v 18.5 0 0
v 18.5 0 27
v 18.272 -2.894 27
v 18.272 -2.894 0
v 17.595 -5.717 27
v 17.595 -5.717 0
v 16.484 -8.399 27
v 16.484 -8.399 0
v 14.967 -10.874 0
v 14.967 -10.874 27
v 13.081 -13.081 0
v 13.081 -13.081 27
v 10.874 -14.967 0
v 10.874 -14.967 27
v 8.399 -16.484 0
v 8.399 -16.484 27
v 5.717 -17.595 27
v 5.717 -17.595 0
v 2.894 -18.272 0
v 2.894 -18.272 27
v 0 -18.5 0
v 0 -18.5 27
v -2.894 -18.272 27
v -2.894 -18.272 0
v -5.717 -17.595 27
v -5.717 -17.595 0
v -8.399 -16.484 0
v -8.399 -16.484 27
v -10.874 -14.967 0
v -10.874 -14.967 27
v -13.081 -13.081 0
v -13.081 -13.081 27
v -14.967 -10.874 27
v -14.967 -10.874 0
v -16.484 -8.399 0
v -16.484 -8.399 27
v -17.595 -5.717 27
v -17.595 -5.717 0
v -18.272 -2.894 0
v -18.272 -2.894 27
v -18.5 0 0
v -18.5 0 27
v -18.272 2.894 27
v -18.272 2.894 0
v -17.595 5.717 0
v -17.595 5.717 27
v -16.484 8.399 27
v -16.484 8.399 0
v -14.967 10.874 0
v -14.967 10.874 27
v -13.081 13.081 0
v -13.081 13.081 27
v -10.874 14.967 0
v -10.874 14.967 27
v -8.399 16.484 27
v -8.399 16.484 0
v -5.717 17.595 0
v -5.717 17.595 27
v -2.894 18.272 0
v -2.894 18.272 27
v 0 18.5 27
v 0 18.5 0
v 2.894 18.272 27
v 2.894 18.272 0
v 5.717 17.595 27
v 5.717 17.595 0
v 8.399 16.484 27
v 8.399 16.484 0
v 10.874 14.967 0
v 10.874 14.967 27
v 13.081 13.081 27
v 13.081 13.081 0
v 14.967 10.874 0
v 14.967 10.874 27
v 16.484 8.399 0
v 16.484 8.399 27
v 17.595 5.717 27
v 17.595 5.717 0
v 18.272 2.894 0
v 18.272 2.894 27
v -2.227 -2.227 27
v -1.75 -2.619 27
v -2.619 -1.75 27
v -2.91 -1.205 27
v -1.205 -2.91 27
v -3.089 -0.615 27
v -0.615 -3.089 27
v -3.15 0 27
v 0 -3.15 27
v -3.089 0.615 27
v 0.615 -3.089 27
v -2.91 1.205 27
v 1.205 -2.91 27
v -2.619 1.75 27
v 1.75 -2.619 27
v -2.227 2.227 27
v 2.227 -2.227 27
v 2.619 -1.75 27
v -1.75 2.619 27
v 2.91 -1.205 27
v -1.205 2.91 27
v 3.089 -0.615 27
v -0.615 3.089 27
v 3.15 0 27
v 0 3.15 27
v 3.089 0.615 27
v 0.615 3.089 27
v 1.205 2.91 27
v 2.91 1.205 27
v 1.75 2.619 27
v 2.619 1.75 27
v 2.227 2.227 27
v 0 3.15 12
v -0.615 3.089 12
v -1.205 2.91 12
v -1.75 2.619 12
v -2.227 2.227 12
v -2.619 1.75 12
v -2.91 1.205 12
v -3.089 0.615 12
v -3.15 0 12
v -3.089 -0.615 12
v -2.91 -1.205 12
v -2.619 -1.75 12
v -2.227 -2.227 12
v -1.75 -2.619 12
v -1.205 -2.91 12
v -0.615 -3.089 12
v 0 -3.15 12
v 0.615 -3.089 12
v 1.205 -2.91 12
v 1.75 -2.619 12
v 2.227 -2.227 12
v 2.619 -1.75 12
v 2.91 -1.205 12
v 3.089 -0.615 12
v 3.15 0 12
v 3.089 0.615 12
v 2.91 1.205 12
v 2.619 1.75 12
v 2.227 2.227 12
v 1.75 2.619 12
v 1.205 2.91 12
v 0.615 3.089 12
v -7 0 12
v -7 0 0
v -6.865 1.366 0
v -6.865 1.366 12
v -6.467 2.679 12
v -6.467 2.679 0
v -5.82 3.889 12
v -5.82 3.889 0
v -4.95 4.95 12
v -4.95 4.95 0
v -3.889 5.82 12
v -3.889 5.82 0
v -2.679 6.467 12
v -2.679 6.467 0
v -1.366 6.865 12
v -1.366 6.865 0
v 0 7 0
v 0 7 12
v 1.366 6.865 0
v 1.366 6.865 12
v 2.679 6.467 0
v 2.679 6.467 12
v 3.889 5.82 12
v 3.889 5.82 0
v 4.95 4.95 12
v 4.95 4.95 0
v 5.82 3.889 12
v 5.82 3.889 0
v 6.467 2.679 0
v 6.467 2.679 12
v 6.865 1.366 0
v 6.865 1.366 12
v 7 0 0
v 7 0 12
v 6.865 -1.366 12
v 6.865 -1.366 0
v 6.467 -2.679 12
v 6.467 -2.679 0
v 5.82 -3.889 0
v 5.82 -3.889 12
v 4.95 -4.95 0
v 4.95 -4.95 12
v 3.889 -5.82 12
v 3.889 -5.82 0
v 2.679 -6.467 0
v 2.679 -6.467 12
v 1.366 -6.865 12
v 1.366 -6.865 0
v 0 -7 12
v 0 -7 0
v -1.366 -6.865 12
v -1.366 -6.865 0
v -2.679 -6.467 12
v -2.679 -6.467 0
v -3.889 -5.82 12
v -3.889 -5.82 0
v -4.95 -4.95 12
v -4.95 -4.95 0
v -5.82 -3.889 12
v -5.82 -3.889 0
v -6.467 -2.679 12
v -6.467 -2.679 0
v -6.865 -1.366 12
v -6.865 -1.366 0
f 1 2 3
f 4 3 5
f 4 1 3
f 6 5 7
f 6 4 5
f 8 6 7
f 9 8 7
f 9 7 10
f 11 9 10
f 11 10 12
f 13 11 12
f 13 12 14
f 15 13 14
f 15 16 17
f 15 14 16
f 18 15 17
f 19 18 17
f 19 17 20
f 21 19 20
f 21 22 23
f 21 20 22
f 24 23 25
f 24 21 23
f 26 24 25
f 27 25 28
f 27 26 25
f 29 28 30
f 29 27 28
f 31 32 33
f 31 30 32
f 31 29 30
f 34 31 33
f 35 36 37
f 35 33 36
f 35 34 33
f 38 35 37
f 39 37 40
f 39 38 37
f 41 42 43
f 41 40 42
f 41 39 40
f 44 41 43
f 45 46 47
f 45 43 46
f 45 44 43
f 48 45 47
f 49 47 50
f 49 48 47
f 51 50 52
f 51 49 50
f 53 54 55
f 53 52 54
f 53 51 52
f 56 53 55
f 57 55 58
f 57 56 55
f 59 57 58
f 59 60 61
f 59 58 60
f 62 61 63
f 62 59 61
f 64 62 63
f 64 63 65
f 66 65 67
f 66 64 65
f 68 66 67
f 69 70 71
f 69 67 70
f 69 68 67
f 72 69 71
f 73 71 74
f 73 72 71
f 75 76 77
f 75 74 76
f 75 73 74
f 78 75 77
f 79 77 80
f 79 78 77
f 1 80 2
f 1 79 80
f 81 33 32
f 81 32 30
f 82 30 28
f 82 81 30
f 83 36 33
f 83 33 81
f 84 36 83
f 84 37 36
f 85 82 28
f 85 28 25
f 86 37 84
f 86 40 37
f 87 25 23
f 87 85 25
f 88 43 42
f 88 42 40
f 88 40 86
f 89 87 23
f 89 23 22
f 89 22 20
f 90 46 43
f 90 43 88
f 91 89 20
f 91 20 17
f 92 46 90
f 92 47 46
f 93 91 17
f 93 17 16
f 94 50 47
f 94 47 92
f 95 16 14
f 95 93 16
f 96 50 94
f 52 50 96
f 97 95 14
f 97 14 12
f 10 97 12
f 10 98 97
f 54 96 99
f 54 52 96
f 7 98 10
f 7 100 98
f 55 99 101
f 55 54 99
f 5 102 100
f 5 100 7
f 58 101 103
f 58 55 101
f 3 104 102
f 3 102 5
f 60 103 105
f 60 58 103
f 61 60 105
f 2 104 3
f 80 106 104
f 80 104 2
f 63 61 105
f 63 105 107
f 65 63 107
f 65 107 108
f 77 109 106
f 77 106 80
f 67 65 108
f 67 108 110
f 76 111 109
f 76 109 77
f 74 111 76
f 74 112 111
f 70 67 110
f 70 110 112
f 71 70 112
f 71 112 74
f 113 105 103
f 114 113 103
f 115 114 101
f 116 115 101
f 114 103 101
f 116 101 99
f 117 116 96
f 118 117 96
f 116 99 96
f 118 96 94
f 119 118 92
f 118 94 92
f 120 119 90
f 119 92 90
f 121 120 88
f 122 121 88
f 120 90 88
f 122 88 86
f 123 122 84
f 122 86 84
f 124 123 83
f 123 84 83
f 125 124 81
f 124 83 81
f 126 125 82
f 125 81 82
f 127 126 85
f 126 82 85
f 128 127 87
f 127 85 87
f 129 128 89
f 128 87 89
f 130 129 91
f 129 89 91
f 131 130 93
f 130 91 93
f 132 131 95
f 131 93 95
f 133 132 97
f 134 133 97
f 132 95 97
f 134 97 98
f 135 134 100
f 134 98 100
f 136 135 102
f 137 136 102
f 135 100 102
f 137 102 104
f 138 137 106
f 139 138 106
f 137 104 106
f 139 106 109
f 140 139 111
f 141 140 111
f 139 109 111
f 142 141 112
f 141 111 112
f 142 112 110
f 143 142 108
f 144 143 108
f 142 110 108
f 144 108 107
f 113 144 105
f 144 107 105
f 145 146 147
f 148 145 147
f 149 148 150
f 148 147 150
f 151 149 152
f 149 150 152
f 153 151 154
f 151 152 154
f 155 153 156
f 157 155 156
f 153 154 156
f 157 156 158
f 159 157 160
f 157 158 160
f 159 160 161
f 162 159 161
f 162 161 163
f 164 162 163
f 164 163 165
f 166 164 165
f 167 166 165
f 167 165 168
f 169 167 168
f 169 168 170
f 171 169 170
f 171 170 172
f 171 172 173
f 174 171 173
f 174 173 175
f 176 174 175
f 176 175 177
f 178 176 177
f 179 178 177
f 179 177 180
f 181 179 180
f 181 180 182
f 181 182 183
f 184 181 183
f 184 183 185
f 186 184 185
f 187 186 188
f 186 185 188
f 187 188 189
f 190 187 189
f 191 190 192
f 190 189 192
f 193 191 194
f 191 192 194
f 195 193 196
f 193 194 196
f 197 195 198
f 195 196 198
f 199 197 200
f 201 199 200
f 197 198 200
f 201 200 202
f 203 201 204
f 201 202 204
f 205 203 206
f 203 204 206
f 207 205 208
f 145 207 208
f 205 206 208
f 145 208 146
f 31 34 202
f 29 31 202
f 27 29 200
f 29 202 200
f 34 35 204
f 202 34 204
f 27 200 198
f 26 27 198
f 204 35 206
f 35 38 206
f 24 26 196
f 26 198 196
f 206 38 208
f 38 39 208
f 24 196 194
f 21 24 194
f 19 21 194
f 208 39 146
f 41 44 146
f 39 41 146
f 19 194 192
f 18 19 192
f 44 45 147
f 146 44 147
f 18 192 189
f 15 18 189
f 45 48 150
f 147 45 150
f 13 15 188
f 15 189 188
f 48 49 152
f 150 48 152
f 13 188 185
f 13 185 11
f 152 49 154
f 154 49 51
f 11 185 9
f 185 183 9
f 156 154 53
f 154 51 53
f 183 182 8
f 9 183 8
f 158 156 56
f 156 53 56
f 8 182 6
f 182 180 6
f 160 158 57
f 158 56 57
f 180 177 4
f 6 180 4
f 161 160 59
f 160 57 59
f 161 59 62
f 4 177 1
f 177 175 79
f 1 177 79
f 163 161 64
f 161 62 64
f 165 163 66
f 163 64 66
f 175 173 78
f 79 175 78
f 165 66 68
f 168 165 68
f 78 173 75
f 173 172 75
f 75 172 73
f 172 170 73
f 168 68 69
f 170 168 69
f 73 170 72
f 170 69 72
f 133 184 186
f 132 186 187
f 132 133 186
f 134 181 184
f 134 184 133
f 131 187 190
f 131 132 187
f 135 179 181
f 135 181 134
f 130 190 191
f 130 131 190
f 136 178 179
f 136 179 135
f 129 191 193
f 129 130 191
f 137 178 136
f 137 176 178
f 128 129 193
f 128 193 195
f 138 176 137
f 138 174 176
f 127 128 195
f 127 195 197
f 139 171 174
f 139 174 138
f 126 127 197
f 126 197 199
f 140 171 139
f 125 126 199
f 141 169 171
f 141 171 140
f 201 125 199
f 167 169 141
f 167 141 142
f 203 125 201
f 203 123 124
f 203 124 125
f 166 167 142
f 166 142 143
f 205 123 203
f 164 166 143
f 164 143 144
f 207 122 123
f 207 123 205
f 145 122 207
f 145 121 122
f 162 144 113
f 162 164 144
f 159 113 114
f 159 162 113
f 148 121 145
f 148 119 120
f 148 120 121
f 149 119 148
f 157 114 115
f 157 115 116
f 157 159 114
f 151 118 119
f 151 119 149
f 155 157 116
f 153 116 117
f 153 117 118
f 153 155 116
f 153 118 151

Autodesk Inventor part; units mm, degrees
ref_plane "YZ Plane" through (0, 0, 0) normal (1, 0, 0) x (0, 1, 0)
ref_plane "XZ Plane" through (0, 0, 0) normal (0, 1, 0) x (-1, 0, 0)
ref_plane "XY Plane" through (0, 0, 0) normal (0, 0, 1) x (1, 0, 0)
sketch "Skizze1" plane through (0, 0, 0) normal (0, 0, 1) x (1, 0, 0)
  circle A0 centre (0, 0) radius 18.5
  dimension "d0" = 37
extrude "Extrusion1" add sketch "Skizze1" along normal blind 27
sketch "Skizze2" plane through (0, 0, 0) normal (0, 0, -1) x (-1, 0, 0)
  circle A0 centre (0, 0) radius 7
  dimension "d3" = 14
extrude "Extrusion2" cut sketch "Skizze2" against normal blind 12
sketch "Skizze3" plane through (0, 0, 12) normal (0, 0, -1) x (-1, 0, 0)
  point P0 (0, 0)
hole "Bohrung1" at (0, 0, 12) direction (0, 0, 1) diameter 6.3 end through all
properties part number "GummiFeet" material "Gummi, Silikon"
